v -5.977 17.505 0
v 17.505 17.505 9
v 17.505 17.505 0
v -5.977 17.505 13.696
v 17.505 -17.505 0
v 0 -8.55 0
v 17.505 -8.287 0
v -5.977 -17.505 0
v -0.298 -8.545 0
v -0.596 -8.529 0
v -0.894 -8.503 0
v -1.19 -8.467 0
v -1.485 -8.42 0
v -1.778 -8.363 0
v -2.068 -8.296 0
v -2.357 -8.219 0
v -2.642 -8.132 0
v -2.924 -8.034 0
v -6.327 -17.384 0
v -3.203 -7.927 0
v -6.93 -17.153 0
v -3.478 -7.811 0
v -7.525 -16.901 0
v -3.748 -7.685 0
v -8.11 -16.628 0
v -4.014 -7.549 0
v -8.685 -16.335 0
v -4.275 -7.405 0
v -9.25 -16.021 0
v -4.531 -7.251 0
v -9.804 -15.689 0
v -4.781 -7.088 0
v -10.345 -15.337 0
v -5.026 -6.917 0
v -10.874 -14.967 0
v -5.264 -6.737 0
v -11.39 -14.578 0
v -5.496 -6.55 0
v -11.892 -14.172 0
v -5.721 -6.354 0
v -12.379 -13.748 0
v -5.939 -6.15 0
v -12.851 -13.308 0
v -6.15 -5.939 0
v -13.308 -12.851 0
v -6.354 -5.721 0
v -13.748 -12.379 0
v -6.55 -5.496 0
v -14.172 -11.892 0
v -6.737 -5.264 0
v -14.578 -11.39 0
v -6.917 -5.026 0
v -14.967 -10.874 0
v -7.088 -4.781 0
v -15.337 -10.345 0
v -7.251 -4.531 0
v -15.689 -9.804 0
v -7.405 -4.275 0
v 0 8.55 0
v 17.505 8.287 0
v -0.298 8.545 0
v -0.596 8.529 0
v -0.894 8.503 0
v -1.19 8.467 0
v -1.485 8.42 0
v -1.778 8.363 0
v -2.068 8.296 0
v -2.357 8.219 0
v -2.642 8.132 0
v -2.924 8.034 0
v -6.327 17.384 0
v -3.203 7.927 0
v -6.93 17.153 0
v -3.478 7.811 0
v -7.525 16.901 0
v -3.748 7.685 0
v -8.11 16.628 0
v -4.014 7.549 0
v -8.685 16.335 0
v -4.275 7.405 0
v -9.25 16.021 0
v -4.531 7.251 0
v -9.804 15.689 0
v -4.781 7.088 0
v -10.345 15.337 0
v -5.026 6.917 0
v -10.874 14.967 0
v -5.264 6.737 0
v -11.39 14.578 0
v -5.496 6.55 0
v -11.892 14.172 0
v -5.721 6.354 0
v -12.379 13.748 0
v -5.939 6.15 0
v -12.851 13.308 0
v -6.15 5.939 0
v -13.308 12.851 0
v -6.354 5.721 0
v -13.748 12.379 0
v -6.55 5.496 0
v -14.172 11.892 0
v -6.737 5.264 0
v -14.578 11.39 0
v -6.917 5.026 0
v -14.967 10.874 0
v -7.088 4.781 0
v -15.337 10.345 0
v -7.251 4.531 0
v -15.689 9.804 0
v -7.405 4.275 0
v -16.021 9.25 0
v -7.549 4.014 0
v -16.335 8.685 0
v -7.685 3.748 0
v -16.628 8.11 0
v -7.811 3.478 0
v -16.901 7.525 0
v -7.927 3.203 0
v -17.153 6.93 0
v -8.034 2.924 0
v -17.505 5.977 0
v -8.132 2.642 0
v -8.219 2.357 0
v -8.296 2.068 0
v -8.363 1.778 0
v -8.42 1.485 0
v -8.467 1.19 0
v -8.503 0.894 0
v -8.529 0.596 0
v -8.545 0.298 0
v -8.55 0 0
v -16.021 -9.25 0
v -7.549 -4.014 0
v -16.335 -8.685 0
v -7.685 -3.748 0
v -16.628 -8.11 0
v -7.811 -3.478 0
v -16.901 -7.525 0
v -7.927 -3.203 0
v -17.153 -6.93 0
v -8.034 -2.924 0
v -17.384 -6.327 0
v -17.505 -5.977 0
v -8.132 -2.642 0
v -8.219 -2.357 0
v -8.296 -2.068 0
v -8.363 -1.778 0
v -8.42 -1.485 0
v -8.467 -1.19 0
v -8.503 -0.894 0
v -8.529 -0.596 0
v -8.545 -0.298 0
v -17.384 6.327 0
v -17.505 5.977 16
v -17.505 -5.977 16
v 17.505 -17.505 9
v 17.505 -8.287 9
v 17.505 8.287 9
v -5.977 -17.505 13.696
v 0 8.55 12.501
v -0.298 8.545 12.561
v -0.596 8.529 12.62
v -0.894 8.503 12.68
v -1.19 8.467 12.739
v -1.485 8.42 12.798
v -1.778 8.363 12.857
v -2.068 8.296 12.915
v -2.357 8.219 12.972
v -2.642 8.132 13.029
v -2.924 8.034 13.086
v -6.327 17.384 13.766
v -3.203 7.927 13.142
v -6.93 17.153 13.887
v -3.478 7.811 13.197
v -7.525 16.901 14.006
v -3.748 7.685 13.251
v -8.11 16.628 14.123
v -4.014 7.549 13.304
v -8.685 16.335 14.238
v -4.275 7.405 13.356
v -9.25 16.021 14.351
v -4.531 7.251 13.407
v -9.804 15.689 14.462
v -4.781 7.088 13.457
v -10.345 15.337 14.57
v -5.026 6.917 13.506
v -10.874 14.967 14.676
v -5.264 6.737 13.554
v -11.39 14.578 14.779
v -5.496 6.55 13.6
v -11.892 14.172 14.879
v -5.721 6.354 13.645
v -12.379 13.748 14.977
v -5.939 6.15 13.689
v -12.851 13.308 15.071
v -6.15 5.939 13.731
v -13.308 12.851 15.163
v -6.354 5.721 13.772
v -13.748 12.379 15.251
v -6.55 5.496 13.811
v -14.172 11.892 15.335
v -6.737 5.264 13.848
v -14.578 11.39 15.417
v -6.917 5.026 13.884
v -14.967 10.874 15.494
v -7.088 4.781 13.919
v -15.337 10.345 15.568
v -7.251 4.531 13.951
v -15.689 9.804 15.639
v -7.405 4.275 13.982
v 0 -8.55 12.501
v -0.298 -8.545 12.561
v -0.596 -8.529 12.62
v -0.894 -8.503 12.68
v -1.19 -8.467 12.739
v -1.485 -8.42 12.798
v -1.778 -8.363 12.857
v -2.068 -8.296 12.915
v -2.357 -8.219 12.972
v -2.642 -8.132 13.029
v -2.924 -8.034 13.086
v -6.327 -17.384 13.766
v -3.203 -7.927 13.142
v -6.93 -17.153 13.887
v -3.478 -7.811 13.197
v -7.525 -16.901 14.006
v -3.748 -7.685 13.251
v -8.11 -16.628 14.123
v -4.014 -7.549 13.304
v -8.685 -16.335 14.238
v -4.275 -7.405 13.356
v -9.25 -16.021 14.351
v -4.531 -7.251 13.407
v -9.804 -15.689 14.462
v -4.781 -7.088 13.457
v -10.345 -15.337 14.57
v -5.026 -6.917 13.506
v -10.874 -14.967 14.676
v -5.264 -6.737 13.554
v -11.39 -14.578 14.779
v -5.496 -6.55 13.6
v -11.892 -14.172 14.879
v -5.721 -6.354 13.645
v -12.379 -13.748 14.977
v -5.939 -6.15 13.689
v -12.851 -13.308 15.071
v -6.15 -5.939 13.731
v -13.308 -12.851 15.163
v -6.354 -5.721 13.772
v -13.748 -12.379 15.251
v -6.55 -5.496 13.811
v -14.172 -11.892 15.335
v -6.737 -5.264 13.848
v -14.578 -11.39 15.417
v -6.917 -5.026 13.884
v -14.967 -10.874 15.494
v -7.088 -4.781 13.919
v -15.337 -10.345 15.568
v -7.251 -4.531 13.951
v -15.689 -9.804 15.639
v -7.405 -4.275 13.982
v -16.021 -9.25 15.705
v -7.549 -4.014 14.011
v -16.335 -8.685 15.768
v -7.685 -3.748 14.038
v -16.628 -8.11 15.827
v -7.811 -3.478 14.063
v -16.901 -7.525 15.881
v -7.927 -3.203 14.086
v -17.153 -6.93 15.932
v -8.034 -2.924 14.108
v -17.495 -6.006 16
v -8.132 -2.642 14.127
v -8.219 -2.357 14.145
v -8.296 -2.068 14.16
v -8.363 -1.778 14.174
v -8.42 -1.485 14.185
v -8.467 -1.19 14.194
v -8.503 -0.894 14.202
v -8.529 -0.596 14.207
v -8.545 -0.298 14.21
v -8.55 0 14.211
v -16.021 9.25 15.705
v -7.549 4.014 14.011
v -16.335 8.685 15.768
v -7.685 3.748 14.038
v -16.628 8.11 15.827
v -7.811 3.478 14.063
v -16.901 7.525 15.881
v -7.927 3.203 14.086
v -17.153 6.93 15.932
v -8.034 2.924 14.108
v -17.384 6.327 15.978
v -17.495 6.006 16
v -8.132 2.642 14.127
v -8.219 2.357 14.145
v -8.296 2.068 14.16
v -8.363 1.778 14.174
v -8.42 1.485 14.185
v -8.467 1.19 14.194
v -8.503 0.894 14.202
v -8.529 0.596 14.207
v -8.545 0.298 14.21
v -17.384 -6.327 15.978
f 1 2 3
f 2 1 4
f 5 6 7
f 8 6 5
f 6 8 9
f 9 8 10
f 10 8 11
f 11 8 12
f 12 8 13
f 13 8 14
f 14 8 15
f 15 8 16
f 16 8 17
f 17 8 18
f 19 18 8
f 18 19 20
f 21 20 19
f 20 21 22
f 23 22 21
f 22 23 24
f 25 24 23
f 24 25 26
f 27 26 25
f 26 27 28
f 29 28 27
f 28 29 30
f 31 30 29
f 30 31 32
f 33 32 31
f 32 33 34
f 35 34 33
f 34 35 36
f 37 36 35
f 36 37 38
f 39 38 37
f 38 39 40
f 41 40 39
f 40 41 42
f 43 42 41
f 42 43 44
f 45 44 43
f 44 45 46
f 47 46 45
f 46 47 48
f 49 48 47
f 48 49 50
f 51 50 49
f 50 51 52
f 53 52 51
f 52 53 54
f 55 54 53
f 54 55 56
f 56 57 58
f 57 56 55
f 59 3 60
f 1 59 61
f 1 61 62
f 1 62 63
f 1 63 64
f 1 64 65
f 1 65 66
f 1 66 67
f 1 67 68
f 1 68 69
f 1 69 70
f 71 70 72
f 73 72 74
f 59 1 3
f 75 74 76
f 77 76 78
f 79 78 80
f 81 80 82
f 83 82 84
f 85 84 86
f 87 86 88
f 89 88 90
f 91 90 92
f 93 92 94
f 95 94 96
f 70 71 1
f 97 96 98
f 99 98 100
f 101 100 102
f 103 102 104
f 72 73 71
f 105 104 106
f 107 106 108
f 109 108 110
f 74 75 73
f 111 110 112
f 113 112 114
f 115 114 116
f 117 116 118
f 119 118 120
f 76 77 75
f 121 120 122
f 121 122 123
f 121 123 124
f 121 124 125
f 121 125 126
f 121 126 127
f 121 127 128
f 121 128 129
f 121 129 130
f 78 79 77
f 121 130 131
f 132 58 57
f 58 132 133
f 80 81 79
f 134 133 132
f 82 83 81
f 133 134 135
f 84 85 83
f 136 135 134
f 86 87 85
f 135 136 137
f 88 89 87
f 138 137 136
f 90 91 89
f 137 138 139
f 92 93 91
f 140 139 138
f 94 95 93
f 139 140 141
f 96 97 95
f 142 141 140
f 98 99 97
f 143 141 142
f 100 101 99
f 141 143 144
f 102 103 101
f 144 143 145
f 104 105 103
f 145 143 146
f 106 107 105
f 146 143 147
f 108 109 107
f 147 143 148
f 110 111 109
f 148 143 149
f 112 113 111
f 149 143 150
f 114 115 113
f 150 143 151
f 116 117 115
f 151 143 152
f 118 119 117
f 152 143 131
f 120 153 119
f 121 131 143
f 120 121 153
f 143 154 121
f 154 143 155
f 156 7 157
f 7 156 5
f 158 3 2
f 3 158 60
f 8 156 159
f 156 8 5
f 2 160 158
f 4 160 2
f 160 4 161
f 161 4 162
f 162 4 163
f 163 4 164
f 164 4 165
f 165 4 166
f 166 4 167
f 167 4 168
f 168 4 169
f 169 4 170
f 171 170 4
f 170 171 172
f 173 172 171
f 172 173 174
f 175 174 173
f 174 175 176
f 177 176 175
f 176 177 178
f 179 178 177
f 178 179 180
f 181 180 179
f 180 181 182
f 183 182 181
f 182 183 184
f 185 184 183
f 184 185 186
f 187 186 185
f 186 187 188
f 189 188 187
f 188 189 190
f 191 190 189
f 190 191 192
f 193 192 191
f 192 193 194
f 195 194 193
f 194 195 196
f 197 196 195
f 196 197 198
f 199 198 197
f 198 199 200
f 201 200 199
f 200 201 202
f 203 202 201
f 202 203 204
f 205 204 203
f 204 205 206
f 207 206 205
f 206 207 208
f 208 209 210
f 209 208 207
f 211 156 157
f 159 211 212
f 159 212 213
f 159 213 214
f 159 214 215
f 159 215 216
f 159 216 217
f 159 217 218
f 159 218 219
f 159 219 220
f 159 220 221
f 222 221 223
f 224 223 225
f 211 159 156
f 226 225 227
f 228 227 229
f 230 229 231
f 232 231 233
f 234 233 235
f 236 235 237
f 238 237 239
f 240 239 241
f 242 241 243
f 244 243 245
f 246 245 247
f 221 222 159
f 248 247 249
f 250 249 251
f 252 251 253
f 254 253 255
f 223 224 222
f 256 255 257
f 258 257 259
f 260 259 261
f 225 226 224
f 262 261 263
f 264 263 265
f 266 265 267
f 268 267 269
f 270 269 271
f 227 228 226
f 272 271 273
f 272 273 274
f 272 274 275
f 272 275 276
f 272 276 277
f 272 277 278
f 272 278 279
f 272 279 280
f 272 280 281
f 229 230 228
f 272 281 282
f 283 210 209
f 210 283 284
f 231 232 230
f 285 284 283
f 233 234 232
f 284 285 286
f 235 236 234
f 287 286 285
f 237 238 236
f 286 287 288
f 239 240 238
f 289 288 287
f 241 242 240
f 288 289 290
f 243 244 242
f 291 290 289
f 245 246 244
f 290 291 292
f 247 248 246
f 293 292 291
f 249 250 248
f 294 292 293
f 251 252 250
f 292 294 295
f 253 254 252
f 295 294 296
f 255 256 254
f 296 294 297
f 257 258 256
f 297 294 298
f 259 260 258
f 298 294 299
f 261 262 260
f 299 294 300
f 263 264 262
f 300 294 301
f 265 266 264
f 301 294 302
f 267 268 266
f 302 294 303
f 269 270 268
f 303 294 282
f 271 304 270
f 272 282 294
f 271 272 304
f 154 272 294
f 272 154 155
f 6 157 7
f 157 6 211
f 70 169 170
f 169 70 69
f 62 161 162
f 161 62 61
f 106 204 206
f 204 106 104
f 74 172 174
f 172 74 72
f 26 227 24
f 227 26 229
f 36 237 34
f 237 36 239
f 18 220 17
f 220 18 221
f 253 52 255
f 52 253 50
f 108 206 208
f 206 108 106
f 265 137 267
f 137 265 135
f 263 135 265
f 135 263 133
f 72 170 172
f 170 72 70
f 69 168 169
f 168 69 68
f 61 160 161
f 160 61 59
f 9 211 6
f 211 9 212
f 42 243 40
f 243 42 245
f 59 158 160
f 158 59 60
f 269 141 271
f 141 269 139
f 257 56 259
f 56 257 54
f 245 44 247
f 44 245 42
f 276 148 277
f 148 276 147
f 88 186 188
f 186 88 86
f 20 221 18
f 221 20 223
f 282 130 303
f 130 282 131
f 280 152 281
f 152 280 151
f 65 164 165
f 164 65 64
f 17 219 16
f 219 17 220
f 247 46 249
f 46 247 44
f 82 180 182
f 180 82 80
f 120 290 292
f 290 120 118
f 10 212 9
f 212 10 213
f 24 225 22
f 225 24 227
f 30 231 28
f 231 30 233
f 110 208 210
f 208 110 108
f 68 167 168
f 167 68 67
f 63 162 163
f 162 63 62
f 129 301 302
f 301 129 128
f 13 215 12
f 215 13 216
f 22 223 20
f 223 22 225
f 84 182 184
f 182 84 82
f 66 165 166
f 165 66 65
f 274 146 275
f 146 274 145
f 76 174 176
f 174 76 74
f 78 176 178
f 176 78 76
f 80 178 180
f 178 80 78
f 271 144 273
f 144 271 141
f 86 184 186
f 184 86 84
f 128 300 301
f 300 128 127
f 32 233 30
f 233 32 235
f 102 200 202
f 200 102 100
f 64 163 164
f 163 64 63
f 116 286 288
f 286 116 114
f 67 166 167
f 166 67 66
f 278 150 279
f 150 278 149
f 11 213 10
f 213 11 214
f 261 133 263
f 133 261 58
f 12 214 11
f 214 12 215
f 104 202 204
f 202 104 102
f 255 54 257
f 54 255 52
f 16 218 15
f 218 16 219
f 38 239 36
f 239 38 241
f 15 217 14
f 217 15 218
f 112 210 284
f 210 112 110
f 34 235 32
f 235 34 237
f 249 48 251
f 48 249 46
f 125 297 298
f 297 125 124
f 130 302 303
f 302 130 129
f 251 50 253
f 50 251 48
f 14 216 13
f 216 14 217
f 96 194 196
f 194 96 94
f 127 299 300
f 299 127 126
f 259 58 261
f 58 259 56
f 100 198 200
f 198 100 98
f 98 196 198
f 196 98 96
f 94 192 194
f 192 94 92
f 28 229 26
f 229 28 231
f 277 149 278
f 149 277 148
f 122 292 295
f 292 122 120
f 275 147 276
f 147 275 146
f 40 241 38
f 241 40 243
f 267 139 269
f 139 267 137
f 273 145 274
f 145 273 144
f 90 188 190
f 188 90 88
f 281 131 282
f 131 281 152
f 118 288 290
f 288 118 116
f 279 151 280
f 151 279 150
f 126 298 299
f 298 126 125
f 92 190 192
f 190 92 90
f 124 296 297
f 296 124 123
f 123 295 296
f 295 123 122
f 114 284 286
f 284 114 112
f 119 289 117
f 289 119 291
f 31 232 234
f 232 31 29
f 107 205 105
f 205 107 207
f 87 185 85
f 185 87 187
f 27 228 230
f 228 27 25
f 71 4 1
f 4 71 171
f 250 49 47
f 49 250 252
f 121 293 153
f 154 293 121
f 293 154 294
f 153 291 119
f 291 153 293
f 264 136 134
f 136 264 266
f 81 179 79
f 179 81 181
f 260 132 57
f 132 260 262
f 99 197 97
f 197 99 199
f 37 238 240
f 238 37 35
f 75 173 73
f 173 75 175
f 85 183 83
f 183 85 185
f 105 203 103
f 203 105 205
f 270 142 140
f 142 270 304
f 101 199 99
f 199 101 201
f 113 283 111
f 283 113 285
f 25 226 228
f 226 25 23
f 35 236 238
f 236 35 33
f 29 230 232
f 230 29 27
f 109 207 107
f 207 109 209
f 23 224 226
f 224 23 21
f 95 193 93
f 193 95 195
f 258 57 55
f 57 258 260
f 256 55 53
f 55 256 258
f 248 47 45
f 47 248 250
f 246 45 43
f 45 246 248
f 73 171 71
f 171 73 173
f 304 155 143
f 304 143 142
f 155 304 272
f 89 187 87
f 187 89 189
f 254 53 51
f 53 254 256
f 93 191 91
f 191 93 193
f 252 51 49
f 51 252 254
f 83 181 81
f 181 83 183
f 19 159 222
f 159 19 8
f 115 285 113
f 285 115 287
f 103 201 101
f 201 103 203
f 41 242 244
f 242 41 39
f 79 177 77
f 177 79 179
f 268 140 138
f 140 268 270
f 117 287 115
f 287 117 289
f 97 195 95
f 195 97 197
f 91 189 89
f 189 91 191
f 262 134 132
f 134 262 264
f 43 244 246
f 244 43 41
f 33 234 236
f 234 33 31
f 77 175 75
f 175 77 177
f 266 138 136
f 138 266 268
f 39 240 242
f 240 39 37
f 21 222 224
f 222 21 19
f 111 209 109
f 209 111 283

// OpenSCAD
$fn = 180;
neck_dia=17;
front_height=9;
back_height=16;
total_base_size=35;


module shaft_cutout() {
    hull() {
    cylinder(h=60,d=neck_dia+0.1,center=true);
    translate([(total_base_size+5)/2,0,0])
    cylinder(h=60,d=neck_dia-0.5,center=true);
    }
}

module cutout() {
        shaft_cutout();
   
}

module round_body() {
    difference(){
        hull() {
            corner_pos=total_base_size/2;

            translate([total_base_size/2,total_base_size/2,0.005])
                cube(0.01,center=true);
            translate([total_base_size/2,-total_base_size/2,0.005])
                cube(0.01,center=true);
            translate([-total_base_size/2,-total_base_size/2,0.005])
                cube(0.01,center=true);
            translate([-total_base_size/2,total_base_size/2,0.005])
                cube(0.01,center=true);

            translate([total_base_size/2,total_base_size/2,front_height-0.005])
                cube(0.01,center=true);
            translate([total_base_size/2,-total_base_size/2,front_height-0.005])
                cube(0.01,center=true);
            translate([-total_base_size/2,-total_base_size/2,back_height-0.005])
                cube(0.01,center=true);
            translate([-total_base_size/2,total_base_size/2,back_height-0.005])
                cube(0.01,center=true);
        }
        cutout();
    }
}
    
module tail_cut() {
    intersection() {
        round_body();
        difference() {
            cube([total_base_size+5,total_base_size+5,total_base_size*2],center=true);    
            cylinder(h=total_base_size*2,d=total_base_size+2,center=true);
            translate([(total_base_size+5)/4,0,0]) cube([(total_base_size+5)/2,total_base_size+5,total_base_size*2],center=true);    
        }
    }
}
    //Lineup aids
/*
    translate([total_base_size/2+2,0,front_height/2])
    cylinder(h=front_height,d=1,center=true);
        translate([-total_base_size/2-2,0,back_height/2])
    cylinder(h=back_height,d=1,center=true);
*/
difference(){
    round_body();
    translate([0,0,-0.5])
        scale([1,1,1.5])
            tail_cut();
}
